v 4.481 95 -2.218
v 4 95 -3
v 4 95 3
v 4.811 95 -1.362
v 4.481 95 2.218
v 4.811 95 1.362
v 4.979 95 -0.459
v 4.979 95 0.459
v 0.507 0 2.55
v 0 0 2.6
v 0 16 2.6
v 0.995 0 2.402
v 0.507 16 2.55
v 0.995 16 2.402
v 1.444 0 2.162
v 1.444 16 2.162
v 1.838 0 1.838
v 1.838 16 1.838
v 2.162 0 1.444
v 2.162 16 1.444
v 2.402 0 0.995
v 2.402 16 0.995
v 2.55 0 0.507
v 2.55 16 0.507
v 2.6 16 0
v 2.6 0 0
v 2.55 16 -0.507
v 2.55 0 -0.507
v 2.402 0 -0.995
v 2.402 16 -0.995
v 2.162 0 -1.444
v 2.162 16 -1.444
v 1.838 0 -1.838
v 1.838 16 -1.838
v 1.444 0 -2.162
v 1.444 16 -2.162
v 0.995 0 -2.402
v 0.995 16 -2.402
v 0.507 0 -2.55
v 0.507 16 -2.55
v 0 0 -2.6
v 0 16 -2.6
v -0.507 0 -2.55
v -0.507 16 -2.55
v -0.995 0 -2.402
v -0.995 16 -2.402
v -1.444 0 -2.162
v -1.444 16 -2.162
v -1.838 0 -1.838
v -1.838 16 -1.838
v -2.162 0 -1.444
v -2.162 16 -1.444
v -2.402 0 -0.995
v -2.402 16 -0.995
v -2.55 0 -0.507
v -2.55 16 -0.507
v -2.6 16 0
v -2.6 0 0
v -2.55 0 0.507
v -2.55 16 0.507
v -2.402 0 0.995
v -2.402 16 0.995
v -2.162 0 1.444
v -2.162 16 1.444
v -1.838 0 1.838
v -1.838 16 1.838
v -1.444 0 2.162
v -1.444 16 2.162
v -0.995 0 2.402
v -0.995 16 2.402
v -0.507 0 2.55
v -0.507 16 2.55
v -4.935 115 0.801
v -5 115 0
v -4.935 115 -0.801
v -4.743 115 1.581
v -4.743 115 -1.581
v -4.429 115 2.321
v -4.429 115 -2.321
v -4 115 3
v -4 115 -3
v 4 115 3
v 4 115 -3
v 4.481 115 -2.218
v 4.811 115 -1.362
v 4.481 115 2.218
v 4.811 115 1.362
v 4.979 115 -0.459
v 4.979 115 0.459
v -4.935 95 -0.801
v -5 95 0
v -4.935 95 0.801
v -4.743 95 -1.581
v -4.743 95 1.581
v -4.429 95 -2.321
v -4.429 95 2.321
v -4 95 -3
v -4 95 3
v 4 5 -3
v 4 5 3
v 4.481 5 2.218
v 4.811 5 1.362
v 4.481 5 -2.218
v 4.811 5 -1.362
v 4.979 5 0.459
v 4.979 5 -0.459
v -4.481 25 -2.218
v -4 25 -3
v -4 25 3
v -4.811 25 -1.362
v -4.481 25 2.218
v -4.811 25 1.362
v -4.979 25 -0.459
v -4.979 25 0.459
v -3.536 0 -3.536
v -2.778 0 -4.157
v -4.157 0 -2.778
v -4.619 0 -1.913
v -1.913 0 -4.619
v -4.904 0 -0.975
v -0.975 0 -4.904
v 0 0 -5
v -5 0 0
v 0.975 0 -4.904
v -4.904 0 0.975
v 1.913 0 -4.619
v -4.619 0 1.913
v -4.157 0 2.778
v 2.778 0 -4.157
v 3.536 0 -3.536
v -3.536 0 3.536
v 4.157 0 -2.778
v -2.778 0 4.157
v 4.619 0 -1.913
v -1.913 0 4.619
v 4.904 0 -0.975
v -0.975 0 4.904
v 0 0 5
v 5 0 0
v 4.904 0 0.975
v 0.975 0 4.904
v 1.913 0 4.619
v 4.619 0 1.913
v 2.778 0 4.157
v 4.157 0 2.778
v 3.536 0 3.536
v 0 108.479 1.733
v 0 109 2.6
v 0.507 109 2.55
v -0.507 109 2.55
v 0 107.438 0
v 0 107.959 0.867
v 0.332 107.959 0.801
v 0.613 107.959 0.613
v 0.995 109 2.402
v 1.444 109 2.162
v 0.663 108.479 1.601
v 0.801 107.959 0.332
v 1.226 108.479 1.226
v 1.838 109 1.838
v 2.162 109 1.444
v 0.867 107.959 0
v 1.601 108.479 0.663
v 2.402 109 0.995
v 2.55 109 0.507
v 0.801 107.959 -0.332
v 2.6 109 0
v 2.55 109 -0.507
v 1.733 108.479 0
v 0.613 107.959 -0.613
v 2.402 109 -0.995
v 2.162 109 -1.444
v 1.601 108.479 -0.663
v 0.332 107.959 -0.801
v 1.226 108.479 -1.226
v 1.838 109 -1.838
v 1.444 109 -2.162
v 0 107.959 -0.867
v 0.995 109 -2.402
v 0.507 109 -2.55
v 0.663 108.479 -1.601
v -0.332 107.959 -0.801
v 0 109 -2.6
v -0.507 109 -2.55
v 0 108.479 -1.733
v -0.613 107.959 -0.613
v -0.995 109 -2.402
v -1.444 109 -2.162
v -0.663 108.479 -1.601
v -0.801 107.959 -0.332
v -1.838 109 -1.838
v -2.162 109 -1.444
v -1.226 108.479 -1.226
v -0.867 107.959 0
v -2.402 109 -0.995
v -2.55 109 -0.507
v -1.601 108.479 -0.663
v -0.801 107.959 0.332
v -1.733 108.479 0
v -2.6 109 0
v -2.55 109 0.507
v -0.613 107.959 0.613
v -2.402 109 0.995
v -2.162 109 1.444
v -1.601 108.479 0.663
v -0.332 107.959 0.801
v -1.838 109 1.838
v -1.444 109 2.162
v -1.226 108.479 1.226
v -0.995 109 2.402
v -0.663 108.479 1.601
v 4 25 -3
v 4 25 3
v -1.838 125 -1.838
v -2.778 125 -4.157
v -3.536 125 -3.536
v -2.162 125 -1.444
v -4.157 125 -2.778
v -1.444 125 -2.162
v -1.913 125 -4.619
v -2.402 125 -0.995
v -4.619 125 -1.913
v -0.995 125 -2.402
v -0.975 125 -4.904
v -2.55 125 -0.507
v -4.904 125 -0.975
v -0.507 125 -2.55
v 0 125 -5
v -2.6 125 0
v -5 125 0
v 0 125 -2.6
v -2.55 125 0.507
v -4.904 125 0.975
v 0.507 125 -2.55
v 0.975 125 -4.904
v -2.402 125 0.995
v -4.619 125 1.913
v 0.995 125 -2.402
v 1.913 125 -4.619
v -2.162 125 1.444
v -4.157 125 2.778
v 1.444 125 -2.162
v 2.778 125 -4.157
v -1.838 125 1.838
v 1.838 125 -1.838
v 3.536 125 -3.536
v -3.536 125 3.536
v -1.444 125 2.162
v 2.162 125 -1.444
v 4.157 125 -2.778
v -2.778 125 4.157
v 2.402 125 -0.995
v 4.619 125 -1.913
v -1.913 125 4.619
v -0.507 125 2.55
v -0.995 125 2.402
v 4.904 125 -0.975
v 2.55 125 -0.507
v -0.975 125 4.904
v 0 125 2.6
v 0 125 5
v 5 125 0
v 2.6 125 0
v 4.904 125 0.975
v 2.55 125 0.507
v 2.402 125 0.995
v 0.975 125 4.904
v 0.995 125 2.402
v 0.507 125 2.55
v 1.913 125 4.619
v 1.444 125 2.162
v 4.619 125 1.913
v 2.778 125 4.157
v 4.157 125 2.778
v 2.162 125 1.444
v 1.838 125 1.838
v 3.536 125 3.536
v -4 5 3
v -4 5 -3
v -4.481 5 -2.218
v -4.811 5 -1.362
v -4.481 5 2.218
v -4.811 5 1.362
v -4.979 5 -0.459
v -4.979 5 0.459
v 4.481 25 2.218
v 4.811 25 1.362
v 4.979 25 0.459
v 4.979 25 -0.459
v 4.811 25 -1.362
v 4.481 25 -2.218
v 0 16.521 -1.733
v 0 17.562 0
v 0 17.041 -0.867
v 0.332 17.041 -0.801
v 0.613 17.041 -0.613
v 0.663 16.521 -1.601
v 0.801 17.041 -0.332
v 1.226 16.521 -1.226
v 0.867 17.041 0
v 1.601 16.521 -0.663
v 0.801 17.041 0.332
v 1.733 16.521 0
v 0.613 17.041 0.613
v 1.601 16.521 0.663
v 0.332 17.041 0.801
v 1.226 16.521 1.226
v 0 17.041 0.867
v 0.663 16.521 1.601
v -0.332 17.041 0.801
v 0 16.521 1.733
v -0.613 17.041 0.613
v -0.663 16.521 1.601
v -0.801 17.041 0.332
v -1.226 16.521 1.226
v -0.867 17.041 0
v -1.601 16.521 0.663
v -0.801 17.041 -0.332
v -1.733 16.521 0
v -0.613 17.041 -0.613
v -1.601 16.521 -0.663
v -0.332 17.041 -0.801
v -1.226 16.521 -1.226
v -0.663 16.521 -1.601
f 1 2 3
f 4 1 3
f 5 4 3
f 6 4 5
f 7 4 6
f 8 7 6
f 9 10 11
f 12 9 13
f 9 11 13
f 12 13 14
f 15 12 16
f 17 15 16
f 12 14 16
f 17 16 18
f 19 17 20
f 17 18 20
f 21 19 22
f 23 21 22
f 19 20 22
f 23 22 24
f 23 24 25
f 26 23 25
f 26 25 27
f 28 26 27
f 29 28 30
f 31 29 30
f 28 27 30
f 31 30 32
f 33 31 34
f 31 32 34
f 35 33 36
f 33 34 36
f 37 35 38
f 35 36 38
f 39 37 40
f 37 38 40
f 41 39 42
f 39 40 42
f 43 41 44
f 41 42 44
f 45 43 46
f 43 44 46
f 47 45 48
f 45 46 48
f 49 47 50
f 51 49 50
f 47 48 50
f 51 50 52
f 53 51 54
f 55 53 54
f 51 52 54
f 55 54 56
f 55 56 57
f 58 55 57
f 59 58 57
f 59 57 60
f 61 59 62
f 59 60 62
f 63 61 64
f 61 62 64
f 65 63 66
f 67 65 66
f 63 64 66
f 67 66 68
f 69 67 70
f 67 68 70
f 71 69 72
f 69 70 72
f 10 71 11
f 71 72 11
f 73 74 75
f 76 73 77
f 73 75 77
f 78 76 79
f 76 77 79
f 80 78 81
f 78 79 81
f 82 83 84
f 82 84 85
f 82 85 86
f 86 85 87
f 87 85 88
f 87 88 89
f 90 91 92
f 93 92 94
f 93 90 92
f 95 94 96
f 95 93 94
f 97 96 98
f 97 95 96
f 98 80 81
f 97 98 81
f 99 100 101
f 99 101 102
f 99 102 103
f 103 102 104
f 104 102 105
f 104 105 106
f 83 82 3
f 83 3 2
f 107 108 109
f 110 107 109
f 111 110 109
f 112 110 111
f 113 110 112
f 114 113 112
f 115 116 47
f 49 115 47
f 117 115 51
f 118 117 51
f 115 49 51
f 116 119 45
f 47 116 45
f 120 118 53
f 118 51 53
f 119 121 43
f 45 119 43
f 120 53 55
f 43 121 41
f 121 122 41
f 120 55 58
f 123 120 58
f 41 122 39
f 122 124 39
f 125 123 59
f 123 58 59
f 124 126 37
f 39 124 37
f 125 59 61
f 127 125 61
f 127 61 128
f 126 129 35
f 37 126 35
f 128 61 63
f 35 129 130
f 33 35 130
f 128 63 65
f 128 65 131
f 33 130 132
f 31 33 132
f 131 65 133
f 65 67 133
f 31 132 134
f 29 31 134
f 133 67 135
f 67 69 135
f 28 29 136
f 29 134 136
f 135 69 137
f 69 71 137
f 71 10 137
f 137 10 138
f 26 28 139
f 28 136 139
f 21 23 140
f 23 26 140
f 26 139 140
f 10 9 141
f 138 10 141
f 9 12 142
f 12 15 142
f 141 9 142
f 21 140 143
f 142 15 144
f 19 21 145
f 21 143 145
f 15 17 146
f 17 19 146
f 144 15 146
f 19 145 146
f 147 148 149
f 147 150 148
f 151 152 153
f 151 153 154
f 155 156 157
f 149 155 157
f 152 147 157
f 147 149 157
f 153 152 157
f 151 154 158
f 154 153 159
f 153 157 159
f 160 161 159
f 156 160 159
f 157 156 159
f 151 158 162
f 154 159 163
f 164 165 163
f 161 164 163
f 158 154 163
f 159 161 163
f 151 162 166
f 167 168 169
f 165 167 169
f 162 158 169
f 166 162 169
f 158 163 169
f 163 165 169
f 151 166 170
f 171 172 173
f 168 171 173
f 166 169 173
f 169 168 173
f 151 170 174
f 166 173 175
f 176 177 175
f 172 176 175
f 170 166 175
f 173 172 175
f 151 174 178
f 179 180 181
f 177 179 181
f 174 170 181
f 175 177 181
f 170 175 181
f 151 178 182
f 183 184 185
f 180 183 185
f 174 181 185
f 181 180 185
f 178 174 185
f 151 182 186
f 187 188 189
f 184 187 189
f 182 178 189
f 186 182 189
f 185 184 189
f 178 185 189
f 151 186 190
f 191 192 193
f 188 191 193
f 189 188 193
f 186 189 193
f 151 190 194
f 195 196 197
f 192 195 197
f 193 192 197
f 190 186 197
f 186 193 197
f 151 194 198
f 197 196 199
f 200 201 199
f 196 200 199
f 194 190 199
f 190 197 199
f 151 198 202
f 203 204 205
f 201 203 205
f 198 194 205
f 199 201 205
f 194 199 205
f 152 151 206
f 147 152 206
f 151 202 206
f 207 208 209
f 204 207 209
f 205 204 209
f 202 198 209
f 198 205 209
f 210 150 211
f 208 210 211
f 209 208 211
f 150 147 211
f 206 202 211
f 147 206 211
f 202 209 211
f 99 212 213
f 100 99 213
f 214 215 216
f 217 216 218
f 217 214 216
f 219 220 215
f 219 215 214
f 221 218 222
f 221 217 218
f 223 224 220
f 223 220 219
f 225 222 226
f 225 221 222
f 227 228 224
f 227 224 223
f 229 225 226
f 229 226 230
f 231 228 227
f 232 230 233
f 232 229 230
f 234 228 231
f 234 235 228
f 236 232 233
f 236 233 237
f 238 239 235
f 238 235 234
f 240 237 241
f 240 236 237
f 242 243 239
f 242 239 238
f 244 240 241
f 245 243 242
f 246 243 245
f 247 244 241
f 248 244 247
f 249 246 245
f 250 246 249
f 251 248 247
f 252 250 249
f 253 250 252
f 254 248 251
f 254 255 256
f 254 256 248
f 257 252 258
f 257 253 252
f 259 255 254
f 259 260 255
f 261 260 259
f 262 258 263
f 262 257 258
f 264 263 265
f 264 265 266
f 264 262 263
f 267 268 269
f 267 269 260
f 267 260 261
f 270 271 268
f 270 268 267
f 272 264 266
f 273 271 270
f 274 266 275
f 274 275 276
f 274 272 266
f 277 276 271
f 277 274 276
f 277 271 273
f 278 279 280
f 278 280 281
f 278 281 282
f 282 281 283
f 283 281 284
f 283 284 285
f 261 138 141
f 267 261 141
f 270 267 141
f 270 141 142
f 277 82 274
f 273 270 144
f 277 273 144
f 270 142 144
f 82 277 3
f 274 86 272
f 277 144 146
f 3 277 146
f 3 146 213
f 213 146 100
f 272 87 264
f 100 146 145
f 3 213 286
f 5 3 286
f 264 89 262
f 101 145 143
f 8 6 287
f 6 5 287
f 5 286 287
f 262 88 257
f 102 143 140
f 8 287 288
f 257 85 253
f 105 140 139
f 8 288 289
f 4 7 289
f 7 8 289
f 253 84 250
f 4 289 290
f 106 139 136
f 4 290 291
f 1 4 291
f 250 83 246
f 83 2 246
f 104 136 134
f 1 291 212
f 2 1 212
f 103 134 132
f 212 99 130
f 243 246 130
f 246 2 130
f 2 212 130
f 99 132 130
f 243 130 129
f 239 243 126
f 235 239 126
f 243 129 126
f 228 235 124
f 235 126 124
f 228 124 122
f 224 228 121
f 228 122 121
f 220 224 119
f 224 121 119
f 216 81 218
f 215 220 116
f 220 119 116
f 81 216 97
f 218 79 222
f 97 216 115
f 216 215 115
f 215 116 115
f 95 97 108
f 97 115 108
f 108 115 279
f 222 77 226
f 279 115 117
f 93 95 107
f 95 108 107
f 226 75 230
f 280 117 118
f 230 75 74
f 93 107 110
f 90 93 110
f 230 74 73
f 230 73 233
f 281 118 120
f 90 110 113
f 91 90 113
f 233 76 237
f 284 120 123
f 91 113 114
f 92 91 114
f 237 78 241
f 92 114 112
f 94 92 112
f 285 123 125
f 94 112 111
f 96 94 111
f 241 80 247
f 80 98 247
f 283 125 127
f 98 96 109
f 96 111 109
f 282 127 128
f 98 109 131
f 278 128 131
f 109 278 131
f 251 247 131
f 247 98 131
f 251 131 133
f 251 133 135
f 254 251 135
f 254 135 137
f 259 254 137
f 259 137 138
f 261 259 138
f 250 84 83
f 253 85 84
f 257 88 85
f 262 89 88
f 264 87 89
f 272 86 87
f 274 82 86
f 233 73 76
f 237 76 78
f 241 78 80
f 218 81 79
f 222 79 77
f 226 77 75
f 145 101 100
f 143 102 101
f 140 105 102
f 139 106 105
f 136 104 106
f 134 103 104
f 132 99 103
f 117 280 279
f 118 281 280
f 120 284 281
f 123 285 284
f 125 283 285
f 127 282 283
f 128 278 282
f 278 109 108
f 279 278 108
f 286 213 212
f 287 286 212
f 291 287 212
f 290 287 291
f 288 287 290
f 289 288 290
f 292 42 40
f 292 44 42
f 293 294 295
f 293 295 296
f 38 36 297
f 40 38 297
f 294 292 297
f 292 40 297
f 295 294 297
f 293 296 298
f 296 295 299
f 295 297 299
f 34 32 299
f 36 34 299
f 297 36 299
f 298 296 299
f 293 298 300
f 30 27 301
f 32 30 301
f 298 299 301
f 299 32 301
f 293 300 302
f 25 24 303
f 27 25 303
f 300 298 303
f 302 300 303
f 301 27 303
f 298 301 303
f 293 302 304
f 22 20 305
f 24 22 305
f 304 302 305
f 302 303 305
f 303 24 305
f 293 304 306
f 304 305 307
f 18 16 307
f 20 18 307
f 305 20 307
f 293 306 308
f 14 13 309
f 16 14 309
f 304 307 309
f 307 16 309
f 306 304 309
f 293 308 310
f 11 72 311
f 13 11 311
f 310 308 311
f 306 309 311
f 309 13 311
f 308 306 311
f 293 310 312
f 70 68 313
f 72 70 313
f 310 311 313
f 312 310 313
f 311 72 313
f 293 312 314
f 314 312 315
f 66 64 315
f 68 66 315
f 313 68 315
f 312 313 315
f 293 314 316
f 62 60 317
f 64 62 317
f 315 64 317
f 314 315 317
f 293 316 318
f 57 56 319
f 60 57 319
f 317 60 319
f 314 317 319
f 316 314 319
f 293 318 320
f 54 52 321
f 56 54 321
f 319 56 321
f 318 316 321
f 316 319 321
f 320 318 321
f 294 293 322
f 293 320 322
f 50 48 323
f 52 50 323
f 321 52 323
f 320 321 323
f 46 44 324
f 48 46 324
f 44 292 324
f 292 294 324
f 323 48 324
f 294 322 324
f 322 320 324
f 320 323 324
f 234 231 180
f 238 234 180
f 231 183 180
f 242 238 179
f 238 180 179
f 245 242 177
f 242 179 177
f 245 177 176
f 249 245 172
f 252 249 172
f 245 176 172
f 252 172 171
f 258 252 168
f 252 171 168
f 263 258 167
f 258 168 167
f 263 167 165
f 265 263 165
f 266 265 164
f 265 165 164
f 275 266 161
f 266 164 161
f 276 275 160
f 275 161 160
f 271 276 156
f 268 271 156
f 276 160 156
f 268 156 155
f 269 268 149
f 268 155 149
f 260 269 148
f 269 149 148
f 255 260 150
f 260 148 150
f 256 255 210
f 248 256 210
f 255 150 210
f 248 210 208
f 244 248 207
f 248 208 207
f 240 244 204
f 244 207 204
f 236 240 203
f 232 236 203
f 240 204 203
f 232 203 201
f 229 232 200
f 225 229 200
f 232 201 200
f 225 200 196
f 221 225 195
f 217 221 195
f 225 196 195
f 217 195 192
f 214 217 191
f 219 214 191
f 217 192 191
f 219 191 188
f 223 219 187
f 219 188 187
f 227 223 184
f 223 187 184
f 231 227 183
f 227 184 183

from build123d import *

# Parameters (mm, degrees)
SKETCH_1_R          = 5
EXTRUDE_1_DEPTH     = 125
M5X0_8_D            = 5.2
M5X0_8_DEPTH        = 16
M5X0_8_TIP          = 1.562237609
M5X0_8_2_D          = 5.2
M5X0_8_2_DEPTH      = 16
M5X0_8_2_TIP        = 1.562237609
CUT_EXTRUDE_START   = -20
CUT_EXTRUDE_5_DEPTH = 20
CUT_EXTRUDE_6_DEPTH = 20


with BuildPart() as part:
    # ｽｹｯﾁ1 → ﾎﾞｽ - 押し出し1 (new body)
    with BuildSketch(Plane(origin=(0, 0, 0), x_dir=(1, 0, 0), z_dir=(0, 1, 0))):
        with Locations(Location((0, 0, 0), (0, 0, 270))):
            Circle(SKETCH_1_R)
    extrude(amount=EXTRUDE_1_DEPTH)

    # M5x0.8
    with Locations(Plane.ZX.offset(125)):
        with Locations((0, 0)):
            Hole(M5X0_8_D / 2, depth=M5X0_8_DEPTH)
            with Locations((0, 0, -(M5X0_8_DEPTH + M5X0_8_TIP / 2))):  # 118° drill point
                Cone(0, M5X0_8_D / 2, M5X0_8_TIP, mode=Mode.SUBTRACT)

    # M5x0.8 2
    with Locations(Plane(origin=(0, 0, 0), x_dir=(0, 0, -1), z_dir=(0, -1, 0))):
        with Locations((0, 0)):
            Hole(M5X0_8_2_D / 2, depth=M5X0_8_2_DEPTH)
            with Locations((0, 0, -(M5X0_8_2_DEPTH + M5X0_8_2_TIP / 2))):  # 118° drill point
                Cone(0, M5X0_8_2_D / 2, M5X0_8_2_TIP, mode=Mode.SUBTRACT)

    # ｽｹｯﾁ8 → ｶｯﾄ - 押し出し5 (cut)
    with BuildSketch(Plane(origin=(0, 115, 0), x_dir=(1, 0, 0), z_dir=(0, 1, 0)).offset(CUT_EXTRUDE_START)):
        with BuildLine():
            ThreePointArc((4, 3), (5, 0), (4, -3))
            Line((4, -3), (4, 3))
        make_face()
        with BuildLine():
            Line((-4, -2.309397765), (-4, 0))
            Line((-4, 0), (-5, 0))
            ThreePointArc((-5, 0), (-4.74341649, -1.58113883), (-4, -3))
            Line((-4, -3), (-4, -2.309397765))
        make_face()
        with BuildLine():
            Line((-5, 0), (-4, 0))
            Line((-4, 0), (-4, 3))
            ThreePointArc((-4, 3), (-4.74341649, 1.58113883), (-5, 0))
        make_face()
    extrude(amount=CUT_EXTRUDE_5_DEPTH, mode=Mode.SUBTRACT)

    # ｽｹｯﾁ9 → ｶｯﾄ - 押し出し6 (cut)
    with BuildSketch(Plane(origin=(0, 5, 0), x_dir=(-1, 0, 0), z_dir=(0, -1, 0))):
        with BuildLine():
            Line((-4, 3), (-4, -3))
            ThreePointArc((-4, -3), (-5, 0), (-4, 3))
        make_face()
        with BuildLine():
            Line((4, -3), (4, 3))
            ThreePointArc((4, 3), (5, 0), (4, -3))
        make_face()
    extrude(amount=-CUT_EXTRUDE_6_DEPTH, mode=Mode.SUBTRACT)


solid = part.part
